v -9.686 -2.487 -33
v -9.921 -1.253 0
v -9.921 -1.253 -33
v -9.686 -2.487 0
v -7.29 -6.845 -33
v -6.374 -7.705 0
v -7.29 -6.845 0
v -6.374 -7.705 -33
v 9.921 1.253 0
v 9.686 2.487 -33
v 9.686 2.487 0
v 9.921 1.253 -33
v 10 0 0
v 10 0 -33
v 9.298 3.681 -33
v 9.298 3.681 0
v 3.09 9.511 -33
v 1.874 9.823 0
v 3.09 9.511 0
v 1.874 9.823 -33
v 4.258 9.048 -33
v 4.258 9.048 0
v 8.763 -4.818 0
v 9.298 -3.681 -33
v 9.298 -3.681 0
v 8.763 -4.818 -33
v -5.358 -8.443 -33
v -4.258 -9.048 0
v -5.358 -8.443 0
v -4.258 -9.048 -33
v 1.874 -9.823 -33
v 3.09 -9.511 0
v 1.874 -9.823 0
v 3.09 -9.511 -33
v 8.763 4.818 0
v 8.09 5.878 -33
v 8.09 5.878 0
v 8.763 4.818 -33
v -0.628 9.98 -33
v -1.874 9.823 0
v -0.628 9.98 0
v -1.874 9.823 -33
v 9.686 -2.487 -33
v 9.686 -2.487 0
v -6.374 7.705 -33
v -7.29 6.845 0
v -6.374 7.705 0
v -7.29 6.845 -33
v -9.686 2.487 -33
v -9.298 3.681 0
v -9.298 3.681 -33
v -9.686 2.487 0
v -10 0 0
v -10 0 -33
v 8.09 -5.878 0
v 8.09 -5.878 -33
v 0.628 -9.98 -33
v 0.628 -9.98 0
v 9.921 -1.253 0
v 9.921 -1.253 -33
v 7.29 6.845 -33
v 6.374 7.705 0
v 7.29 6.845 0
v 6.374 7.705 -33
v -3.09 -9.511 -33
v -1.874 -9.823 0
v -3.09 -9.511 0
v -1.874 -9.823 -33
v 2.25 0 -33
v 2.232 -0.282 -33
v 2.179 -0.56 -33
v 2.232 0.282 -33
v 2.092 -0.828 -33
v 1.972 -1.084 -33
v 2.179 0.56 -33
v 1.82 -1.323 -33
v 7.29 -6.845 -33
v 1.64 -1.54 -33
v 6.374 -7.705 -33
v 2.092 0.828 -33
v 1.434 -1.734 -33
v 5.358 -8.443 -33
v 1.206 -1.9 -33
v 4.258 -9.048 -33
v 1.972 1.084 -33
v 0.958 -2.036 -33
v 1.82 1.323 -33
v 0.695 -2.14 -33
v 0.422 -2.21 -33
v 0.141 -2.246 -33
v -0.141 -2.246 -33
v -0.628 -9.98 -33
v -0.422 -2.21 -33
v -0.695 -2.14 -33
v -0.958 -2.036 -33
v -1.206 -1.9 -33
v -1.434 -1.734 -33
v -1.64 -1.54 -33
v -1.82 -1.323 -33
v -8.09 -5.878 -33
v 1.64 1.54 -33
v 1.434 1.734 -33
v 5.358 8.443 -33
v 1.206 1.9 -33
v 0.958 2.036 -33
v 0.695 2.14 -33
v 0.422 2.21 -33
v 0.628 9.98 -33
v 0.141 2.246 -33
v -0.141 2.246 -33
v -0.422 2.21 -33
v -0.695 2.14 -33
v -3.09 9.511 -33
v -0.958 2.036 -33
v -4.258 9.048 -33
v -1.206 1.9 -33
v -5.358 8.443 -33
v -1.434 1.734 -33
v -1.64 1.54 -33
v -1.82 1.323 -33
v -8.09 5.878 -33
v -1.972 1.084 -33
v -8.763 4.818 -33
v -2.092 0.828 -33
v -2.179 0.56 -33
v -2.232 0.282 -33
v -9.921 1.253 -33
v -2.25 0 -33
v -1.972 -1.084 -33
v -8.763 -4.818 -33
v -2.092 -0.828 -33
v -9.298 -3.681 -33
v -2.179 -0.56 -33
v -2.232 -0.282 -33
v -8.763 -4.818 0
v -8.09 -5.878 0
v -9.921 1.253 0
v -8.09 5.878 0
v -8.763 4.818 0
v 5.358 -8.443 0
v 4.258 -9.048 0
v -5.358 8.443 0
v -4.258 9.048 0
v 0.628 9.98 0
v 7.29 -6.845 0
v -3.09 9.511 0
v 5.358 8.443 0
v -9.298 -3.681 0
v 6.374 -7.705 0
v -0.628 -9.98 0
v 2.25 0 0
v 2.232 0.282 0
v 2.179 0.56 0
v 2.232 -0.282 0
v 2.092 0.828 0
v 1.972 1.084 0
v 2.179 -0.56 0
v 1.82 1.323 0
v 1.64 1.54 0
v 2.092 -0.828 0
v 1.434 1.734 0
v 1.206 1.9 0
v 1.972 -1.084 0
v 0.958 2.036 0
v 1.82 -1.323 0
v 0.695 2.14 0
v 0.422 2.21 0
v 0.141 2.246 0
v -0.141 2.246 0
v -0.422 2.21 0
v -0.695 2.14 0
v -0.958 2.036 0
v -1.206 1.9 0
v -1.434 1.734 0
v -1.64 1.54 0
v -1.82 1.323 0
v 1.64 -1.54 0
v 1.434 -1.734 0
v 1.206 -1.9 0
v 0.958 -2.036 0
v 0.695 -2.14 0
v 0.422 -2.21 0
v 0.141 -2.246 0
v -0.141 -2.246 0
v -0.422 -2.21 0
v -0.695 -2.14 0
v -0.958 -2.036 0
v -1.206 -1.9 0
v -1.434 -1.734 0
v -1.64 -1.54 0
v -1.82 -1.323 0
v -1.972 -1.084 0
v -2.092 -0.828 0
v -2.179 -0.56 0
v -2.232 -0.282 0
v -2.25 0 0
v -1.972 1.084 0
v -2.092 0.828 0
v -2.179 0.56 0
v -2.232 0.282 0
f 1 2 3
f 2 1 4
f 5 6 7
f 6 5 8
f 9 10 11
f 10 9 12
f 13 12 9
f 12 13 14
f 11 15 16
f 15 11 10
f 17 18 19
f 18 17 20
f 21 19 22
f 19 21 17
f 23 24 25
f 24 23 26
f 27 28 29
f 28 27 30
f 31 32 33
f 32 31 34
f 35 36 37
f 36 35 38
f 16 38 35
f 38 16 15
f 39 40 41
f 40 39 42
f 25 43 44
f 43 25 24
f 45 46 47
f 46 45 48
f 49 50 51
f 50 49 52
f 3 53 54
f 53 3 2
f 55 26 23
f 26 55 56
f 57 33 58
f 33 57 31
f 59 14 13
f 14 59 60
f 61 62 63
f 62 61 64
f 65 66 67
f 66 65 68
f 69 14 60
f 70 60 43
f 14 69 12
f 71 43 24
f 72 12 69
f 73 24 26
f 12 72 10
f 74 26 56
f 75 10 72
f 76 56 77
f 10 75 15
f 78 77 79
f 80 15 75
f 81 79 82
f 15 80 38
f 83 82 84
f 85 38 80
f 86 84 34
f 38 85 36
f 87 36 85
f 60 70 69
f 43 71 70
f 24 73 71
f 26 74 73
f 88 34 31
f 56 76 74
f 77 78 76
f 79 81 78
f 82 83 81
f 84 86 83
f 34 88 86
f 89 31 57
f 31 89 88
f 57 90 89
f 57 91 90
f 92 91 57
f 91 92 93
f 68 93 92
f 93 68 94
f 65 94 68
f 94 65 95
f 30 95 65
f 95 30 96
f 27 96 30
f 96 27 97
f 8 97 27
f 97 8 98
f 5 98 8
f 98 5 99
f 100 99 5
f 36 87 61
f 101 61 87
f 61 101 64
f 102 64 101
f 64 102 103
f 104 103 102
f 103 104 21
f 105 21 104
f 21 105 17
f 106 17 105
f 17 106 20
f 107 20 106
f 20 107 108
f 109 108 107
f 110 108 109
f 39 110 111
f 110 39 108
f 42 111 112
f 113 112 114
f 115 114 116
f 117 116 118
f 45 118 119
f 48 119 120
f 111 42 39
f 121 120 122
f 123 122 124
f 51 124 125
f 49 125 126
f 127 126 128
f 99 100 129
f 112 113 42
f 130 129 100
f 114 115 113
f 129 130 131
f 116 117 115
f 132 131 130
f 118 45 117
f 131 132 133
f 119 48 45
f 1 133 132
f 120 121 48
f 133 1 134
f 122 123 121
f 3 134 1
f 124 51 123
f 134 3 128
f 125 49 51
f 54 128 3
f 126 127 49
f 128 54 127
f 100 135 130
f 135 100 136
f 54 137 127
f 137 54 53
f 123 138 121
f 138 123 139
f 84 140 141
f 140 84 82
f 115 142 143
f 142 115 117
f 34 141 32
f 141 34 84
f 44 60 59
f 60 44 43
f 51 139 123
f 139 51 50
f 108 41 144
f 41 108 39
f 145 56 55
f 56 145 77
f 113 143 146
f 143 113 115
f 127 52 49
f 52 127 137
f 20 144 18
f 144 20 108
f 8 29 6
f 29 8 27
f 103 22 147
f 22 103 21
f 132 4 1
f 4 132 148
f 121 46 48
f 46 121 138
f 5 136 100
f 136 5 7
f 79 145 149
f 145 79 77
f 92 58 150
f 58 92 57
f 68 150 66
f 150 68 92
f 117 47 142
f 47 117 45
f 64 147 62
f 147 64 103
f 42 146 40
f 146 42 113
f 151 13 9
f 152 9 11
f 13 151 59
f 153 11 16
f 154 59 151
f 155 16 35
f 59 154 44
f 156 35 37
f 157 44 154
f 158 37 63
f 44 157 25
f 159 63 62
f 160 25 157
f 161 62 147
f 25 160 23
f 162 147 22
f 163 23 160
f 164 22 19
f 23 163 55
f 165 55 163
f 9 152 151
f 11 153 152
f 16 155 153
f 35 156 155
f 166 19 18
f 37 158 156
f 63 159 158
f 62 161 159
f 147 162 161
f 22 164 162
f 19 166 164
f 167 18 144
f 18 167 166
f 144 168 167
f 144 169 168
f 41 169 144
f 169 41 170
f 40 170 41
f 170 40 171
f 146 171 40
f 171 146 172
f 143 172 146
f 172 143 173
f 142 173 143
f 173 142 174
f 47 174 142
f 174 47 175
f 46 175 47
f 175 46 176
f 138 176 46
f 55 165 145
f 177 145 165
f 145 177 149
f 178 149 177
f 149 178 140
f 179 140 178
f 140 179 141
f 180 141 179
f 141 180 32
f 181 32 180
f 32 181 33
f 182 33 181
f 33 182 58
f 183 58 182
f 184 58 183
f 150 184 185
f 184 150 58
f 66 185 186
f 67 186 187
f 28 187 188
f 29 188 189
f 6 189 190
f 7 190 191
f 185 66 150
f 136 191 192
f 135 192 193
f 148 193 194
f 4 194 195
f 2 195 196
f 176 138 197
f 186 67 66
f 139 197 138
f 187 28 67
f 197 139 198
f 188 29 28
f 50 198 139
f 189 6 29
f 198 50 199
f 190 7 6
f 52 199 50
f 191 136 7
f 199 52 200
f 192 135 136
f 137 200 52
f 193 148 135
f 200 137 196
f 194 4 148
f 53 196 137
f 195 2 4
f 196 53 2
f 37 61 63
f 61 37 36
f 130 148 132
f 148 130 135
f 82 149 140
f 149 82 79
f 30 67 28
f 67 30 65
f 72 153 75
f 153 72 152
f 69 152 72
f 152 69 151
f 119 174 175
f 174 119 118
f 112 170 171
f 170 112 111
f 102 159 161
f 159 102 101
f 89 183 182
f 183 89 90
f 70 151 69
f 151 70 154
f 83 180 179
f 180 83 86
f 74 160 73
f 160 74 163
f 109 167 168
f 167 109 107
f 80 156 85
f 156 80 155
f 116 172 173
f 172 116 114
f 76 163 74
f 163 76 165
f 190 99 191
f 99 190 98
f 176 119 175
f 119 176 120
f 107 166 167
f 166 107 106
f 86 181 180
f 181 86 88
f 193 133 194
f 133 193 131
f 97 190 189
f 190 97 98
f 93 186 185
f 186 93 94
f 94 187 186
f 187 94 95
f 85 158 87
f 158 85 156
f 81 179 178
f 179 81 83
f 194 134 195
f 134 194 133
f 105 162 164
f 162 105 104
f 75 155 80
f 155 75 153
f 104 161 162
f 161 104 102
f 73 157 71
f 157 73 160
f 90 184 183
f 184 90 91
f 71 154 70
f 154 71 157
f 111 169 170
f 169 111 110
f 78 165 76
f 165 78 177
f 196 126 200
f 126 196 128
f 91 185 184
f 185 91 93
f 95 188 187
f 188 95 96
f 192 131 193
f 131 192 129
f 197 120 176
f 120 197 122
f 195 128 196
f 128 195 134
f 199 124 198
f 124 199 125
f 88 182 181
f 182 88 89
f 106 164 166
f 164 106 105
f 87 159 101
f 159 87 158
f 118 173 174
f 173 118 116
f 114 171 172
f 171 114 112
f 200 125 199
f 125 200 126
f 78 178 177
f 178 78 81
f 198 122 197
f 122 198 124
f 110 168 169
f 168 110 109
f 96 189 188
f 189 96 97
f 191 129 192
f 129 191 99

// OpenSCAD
$fn = 50;


difference() {
	union() {
		translate(v = [0, 0, -33.0000000000]) {
			cylinder(h = 33, r = 10.0000000000);
		}
		cylinder(h = 0, r = 19.0000000000);
	}
	union() {
		#translate(v = [0, 0, -33]) {
			cylinder(h = 33, r = 2.2500000000);
		}
	}
}
